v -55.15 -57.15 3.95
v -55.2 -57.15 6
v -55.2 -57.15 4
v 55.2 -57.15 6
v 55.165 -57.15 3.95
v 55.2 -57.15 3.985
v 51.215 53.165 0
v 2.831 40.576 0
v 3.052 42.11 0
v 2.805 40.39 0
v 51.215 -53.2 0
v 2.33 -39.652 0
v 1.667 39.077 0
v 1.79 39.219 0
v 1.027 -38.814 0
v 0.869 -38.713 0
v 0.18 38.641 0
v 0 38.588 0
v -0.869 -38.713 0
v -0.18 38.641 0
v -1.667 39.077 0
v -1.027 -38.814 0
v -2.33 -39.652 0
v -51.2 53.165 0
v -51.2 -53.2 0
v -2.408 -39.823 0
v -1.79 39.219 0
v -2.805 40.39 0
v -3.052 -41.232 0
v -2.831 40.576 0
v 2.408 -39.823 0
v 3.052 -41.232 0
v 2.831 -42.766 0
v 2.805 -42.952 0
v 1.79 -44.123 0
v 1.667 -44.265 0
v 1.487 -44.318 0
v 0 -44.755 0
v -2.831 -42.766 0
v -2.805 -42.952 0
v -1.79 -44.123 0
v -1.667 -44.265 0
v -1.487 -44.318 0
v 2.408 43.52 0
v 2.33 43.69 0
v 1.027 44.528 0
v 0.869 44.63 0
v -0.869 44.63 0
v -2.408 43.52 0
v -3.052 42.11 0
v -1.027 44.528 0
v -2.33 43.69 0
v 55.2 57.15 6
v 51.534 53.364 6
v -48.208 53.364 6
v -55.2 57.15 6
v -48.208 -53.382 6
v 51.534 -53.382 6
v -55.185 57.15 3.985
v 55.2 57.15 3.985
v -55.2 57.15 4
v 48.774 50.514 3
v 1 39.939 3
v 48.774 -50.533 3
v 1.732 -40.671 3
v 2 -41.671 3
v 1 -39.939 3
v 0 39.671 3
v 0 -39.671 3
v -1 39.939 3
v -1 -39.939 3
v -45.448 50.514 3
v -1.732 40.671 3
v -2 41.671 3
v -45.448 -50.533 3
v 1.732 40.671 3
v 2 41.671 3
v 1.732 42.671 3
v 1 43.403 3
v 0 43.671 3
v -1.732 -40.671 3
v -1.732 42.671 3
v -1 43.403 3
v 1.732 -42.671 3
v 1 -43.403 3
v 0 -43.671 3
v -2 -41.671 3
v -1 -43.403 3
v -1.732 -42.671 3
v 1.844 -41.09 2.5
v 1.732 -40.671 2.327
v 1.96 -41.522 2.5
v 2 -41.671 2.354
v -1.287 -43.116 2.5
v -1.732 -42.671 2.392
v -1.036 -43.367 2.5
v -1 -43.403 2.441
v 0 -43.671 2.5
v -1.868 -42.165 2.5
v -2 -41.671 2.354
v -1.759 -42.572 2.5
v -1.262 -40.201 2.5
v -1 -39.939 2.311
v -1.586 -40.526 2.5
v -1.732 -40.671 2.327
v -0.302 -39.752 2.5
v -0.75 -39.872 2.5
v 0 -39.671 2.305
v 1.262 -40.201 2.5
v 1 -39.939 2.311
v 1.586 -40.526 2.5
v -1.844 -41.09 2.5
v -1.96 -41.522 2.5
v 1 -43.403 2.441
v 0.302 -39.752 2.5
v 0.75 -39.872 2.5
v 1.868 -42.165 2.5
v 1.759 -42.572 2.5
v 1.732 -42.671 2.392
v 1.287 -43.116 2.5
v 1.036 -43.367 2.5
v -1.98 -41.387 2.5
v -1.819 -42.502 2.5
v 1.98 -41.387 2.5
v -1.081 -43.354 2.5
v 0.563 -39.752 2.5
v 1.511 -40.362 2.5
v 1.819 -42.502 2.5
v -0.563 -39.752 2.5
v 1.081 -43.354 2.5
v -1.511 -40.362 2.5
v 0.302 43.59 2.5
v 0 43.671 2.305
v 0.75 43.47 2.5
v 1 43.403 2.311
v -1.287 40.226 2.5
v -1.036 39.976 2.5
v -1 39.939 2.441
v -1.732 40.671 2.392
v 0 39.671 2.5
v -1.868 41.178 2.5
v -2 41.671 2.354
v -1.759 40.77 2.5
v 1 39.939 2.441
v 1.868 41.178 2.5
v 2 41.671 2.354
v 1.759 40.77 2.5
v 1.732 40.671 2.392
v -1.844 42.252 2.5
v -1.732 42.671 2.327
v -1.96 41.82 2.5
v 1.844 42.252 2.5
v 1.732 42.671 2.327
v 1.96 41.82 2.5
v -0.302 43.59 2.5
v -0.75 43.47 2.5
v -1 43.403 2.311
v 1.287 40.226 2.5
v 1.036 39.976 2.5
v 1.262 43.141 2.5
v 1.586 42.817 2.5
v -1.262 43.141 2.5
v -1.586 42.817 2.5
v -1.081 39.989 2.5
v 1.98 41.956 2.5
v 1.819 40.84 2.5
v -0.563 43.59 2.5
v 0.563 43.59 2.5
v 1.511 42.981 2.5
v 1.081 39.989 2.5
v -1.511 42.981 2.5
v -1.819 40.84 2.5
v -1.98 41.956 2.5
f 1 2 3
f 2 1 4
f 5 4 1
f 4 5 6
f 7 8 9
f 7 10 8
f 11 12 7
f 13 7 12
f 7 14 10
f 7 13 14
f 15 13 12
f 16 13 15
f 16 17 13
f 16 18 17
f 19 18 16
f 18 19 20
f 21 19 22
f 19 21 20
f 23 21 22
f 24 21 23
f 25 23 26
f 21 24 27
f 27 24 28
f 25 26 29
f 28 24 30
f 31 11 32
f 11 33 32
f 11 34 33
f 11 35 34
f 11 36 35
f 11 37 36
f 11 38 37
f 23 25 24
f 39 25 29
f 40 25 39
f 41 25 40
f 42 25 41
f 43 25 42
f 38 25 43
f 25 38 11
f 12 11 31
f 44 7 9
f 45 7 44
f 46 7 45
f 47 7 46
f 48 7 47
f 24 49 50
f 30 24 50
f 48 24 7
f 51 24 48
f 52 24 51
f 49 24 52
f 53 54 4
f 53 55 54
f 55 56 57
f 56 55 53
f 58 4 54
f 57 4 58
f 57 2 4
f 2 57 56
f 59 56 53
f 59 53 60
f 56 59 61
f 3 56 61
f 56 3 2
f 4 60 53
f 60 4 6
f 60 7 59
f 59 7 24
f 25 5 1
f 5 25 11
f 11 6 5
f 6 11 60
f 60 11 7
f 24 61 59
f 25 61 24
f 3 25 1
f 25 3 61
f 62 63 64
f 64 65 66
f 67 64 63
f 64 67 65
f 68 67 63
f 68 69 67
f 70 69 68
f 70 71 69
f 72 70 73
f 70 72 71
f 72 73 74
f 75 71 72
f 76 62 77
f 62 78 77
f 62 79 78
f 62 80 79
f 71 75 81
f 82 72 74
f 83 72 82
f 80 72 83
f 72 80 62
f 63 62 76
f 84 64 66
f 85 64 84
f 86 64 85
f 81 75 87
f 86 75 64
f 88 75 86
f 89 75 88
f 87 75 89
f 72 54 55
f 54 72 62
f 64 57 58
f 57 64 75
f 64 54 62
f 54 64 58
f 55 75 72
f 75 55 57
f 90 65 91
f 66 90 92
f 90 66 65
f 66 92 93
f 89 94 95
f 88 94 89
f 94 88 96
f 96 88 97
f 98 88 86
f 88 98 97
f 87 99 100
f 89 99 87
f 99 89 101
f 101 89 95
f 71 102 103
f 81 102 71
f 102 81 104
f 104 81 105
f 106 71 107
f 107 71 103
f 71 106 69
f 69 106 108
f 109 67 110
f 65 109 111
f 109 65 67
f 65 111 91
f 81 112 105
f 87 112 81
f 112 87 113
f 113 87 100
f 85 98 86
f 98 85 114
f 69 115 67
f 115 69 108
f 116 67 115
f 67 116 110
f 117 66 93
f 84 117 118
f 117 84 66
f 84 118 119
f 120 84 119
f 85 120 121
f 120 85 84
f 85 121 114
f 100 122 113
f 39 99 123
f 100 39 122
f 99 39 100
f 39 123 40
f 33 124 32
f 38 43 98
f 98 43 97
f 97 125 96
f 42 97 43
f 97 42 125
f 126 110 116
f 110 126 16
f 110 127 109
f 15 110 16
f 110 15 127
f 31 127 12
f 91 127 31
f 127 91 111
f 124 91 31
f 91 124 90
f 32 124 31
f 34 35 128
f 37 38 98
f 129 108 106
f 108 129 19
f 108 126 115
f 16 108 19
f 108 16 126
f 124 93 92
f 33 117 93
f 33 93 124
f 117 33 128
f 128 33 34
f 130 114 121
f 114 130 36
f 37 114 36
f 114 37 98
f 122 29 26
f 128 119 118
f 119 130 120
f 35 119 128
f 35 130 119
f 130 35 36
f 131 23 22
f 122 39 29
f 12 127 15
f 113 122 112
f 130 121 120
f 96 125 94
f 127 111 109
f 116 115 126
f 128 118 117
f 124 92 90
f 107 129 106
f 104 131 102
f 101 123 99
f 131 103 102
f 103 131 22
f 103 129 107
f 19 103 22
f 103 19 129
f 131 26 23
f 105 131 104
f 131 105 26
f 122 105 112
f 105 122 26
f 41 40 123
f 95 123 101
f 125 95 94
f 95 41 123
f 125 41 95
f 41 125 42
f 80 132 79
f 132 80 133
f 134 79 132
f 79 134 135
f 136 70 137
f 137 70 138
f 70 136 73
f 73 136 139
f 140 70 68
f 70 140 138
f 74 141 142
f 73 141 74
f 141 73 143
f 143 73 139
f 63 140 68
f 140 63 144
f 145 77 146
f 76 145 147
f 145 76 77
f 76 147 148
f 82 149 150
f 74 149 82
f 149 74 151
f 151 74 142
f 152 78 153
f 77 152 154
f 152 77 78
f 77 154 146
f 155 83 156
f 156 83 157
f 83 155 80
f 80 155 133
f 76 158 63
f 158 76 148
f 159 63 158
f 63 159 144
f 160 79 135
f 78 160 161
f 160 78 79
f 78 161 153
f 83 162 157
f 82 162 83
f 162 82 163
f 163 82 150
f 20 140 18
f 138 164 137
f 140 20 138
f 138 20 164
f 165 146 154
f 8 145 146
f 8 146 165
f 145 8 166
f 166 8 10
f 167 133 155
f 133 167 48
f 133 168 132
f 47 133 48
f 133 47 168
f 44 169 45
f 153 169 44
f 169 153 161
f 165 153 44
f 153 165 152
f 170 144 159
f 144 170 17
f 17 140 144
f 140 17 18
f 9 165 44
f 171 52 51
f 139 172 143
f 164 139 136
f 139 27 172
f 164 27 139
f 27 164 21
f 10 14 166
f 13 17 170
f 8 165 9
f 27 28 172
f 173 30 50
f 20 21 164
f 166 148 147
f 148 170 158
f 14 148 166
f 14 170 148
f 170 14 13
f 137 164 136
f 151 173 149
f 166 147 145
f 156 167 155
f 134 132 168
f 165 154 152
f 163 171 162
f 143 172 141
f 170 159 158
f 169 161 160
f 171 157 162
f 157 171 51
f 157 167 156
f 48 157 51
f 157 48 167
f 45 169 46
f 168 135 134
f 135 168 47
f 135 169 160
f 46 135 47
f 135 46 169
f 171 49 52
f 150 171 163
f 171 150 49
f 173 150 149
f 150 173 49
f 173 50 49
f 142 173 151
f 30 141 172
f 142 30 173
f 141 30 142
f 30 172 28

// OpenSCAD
// WALLY - Wall Plate Customizer v1.3
// by TheNewHobbyist 2013 (http://thenewhobbyist.com)
// http://www.thingiverse.com/thing:47956
//
// Most of the connectors used with this thing are panel mount connectors from
// www.DataPro.net I can't vouch for their quality but they did have easy to
// find dimensions for their products so I used them.
//
// This could be tightened up considerably but I thought I'd get it out there for people
// to experiment with before I lose my mind staring at it too long. Also this is my
// first OpenSCAD model so cut me some slack ;)
//
//   Notes:
//
// * The plug types "Duplex Outlet", "Long_Toggle Switch", "Toggle Switch", and "Rocker"
//   will all use the entire plate when selected in top or bottom configuration. The
//   other selection (if not "none" will be selected.
//
// * "None" and "Blank should not be considered equal. if "None" is selected for one of
//   the two holes on a plate the other selection will be centered on that plate. If
//   "Blank" is selected that plug location will remain blank but the other selection
//   will NOT move into a centered position.
//
//	Change Log:
//
//	v1.1
//	UPDATED: Screw hole locations for designer and toggle plate types.
//	UPDATED: Hole size for designer plate type.
//	UPDATED: Outlet hole spacing
//
//	v1.2
//	ADDED: Long Toggle Switch for laird
//
//	v1.3
//	ADDED: 3 new sizes for plate export: Standard, Junior-Jumbo, and Jumbo.
//

  //////////////////////////
 // Customizer Settings: //
//////////////////////////

//How big are we talkin' here?
plate_width = 1; //	[1:5]

// Bigger hole in your wall? Try this
plate_size = 0; // [0:Standard, 1:Junior-Jumbo, 2:Jumbo,]

//Pick a plug or full plate type
1st_plate = "none";  //	["none":None, "blank":Blank Port, "toggle":Full Plate - Toggle Switch, "long_toggle":Full Plate - Long Toggle Switch, "outlet":Full Plate - Duplex Outlet, "rocker":Full Plate - Rocker/Designer Plate, "keystone1":Keystone Jack, "vga":VGA Port, "hdmi":HDMI Port, "dvi":DVI-I Port, "displayport":Displayport, "cat5e":Cat5e/Cat6 Port, "usb-a":USB-A Port, "usb-b":USB-B Port, "firewire":Firewire IEEE 1394 Port, "db09":DB-09 Port, "ps2":PS2 Port, "f-type": F-Type/Coaxial Port,"svideo":S-Video Port, "stereo":Stereo Headphone Jack]
//Pick a bottom plug type or leave as none
1st_plate_bottom_hole = "none";  //	["none":None, "blank":Blank Port, "keystone1":Keystone Jack, "vga":VGA Port, "hdmi":HDMI Port, "dvi":DVI-I Port, "displayport":Displayport, "cat5e":Cat5e/Cat6 Port, "usb-a":USB-A Port, "usb-b":USB-B Port, "firewire":Firewire IEEE 1394 Port, "db09":DB-09 Port, "ps2":PS2 Port, "f-type": F-Type/Coaxial Port,"svideo":S-Video Port, "stereo":Stereo Headphone Jack]
//Pick a plug or full plate type
2nd_plate = "none";  //	["none":None, "blank":Blank Port, "toggle":Full Plate - Toggle Switch, "long_toggle":Full Plate - Long Toggle Switch, "outlet":Full Plate - Duplex Outlet, "rocker":Full Plate - Rocker/Designer Plate, "keystone1":Keystone Jack, "vga":VGA Port, "hdmi":HDMI Port, "dvi":DVI-I Port, "displayport":Displayport, "cat5e":Cat5e/Cat6 Port, "usb-a":USB-A Port, "usb-b":USB-B Port, "firewire":Firewire IEEE 1394 Port, "db09":DB-09 Port, "ps2":PS2 Port, "f-type": F-Type/Coaxial Port,"svideo":S-Video Port, "stereo":Stereo Headphone Jack]
//Pick a bottom plug type or leave as none
2nd_plate_bottom_hole = "none";  //	["none":None, "blank":Blank Port, "keystone1":Keystone Jack, "vga":VGA Port, "hdmi":HDMI Port, "dvi":DVI-I Port, "displayport":Displayport, "cat5e":Cat5e/Cat6 Port, "usb-a":USB-A Port, "usb-b":USB-B Port, "firewire":Firewire IEEE 1394 Port, "db09":DB-09 Port, "ps2":PS2 Port, "f-type": F-Type/Coaxial Port,"svideo":S-Video Port, "stereo":Stereo Headphone Jack]
//Pick a plug or full plate type
3rd_plate = "none";  //	["none":None, "blank":Blank Port, "toggle":Full Plate - Toggle Switch, "long_toggle":Full Plate - Long Toggle Switch, "outlet":Full Plate - Duplex Outlet, "rocker":Full Plate - Rocker/Designer Plate, "keystone1":Keystone Jack, "vga":VGA Port, "hdmi":HDMI Port, "dvi":DVI-I Port, "displayport":Displayport, "cat5e":Cat5e/Cat6 Port, "usb-a":USB-A Port, "usb-b":USB-B Port, "firewire":Firewire IEEE 1394 Port, "db09":DB-09 Port, "ps2":PS2 Port, "f-type": F-Type/Coaxial Port,"svideo":S-Video Port, "stereo":Stereo Headphone Jack]
//Pick a bottom plug type or leave as none
3rd_plate_bottom_hole = "none";  //	["none":None, "blank":Blank Port, "keystone1":Keystone Jack, "vga":VGA Port, "hdmi":HDMI Port, "dvi":DVI-I Port, "displayport":Displayport, "cat5e":Cat5e/Cat6 Port, "usb-a":USB-A Port, "usb-b":USB-B Port, "firewire":Firewire IEEE 1394 Port, "db09":DB-09 Port, "ps2":PS2 Port, "f-type": F-Type/Coaxial Port,"svideo":S-Video Port, "stereo":Stereo Headphone Jack]
//Pick a plug or full plate type
4th_plate = "none";  //["none":None, "blank":Blank Port, "toggle":Full Plate - Toggle Switch, "long_toggle":Full Plate - Long Toggle Switch, "outlet":Full Plate - Duplex Outlet, "rocker":Full Plate - Rocker/Designer Plate, "keystone1":Keystone Jack, "vga":VGA Port, "hdmi":HDMI Port, "dvi":DVI-I Port, "displayport":Displayport, "cat5e":Cat5e/Cat6 Port, "usb-a":USB-A Port, "usb-b":USB-B Port, "firewire":Firewire IEEE 1394 Port, "db09":DB-09 Port, "ps2":PS2 Port, "f-type": F-Type/Coaxial Port,"svideo":S-Video Port, "stereo":Stereo Headphone Jack]
//Pick a bottom plug type or leave as none
4th_plate_bottom_hole = "none";  //	["none":None, "blank":Blank Port, "keystone1":Keystone Jack, "vga":VGA Port, "hdmi":HDMI Port, "dvi":DVI-I Port, "displayport":Displayport, "cat5e":Cat5e/Cat6 Port, "usb-a":USB-A Port, "usb-b":USB-B Port, "firewire":Firewire IEEE 1394 Port, "db09":DB-09 Port, "ps2":PS2 Port, "f-type": F-Type/Coaxial Port,"svideo":S-Video Port, "stereo":Stereo Headphone Jack]
//Pick a plug or full plate type
5th_plate = "none";  //["none":None, "blank":Blank Port, "toggle":Full Plate - Toggle Switch, "long_toggle":Full Plate - Long Toggle Switch, "outlet":Full Plate - Duplex Outlet, "rocker":Full Plate - Rocker/Designer Plate, "keystone1":Keystone Jack, "vga":VGA Port, "hdmi":HDMI Port, "dvi":DVI-I Port, "displayport":Displayport, "cat5e":Cat5e/Cat6 Port, "usb-a":USB-A Port, "usb-b":USB-B Port, "firewire":Firewire IEEE 1394 Port, "db09":DB-09 Port, "ps2":PS2 Port, "f-type": F-Type/Coaxial Port,"svideo":S-Video Port, "stereo":Stereo Headphone Jack]
//Pick a bottom plug type or leave as none
5th_plate_bottom_hole = "none";  //	["none":None, "blank":Blank Port, "keystone1":Keystone Jack, "vga":VGA Port, "hdmi":HDMI Port, "dvi":DVI-I Port, "displayport":Displayport, "cat5e":Cat5e/Cat6 Port, "usb-a":USB-A Port, "usb-b":USB-B Port, "firewire":Firewire IEEE 1394 Port, "db09":DB-09 Port, "ps2":PS2 Port, "f-type": F-Type/Coaxial Port,"svideo":S-Video Port, "stereo":Stereo Headphone Jack]

  //////////////////////
 // Static Settings: //
//////////////////////

module GoAwayCustomizer() {
// This module is here to stop Customizer from picking up the variables below
}

l_offset = [55.2,39.6875,44.45];//34.925,39.6875
r_offset = [55.2,39.6875,44.45];
spacer = [0,0,46.0375,92.075,138.1125,184.15];
solid_plate_width = l_offset[plate_size] + spacer[plate_width] + r_offset[plate_size];//!!!!plate width squeaspacer[plate_width*2] r!!!!!

height_sizes = [114.3,123.825,133.35];

height =114.3 ; //plate height (static)114.3
gang_width=[0,69.86,115.824,161.925,206.375,254]; // Plate widths (standard)69.86

edgewidth = solid_plate_width + 10; // Bevel setting for top and bottom
rightbevel = solid_plate_width -4; // Bevel for right side (scales)

left_offset = 34.925; // Offset first hole position34.925
switch_offset = 46.0375; // Offset all additional holes
thinner_offset=[0,0.92,0.95,0.96,0.97,0.973]; // Manual fix for right side wackiness

positions=[height_sizes[plate_size]/2,height_sizes[plate_size]/2 - 14.25,height_sizes[plate_size]/2 + 14.25];

// preview[view:north, tilt:bottom]

  ///////////////////
 // Hole Control: //
///////////////////

module plate1(){
	if (1st_plate == "toggle" || 1st_plate_bottom_hole == "toggle"){
		translate([0,l_offset[plate_size],0]) toggle_screws();
		translate([0,l_offset[plate_size],0]) hole("toggle");
		}
	else if (1st_plate == "long_toggle" || 1st_plate_bottom_hole == "long_toggle"){
		translate([0,l_offset[plate_size],0]) toggle_screws();
		translate([0,l_offset[plate_size],0]) hole("long_toggle");
		}
	else if (1st_plate == "rocker" || 1st_plate_bottom_hole == "rocker"){
		translate([0,l_offset[plate_size],0]) rocker_screws();
		translate([0,l_offset[plate_size],0]) hole("rocker");
		}
	else if (1st_plate == "outlet" || 1st_plate_bottom_hole == "outlet") {
	translate([0,l_offset[plate_size],0]) hole("outlet");
	}
	else if (1st_plate_bottom_hole == "none") {
		translate([0,l_offset[plate_size],0]) box_screws();
		translate([positions[0],l_offset[plate_size],0]) hole(1st_plate);
			}
	else if (1st_plate == "none") {
		translate([0,l_offset[plate_size],0]) box_screws();
		translate([positions[0],l_offset[plate_size],0]) hole(1st_plate_bottom_hole);
			}
	else {
	translate([0,l_offset[plate_size],0]) box_screws();
	translate([positions[1],l_offset[plate_size],0]) hole(1st_plate);
	translate([positions[2],l_offset[plate_size],0]) hole(1st_plate_bottom_hole);
	}
}

module plate2(){
	if (2nd_plate == "toggle" || 2nd_plate_bottom_hole == "toggle"){
		translate([0,l_offset[plate_size] + switch_offset,0]) toggle_screws();
		translate([0,l_offset[plate_size] + switch_offset,0]) hole("toggle");
		}
	else if (2nd_plate == "long_toggle" || 2nd_plate_bottom_hole == "long_toggle"){
		translate([0,l_offset[plate_size] + switch_offset,0]) toggle_screws();
		translate([0,l_offset[plate_size] + switch_offset,0]) hole("long_toggle");
		}
	else if (2nd_plate == "rocker" || 2nd_plate_bottom_hole == "rocker"){
		translate([0,l_offset[plate_size] + switch_offset,0]) rocker_screws();
		translate([0,l_offset[plate_size] + switch_offset,0]) hole("rocker");
		}
	else if (2nd_plate == "outlet" || 2nd_plate_bottom_hole == "outlet") {
	translate([0,l_offset[plate_size] + switch_offset,0]) hole("outlet");
	}
	else if (2nd_plate_bottom_hole == "none") {
		translate([0,l_offset[plate_size] + switch_offset,0]) box_screws();
		translate([positions[0],l_offset[plate_size] + switch_offset,0]) hole(2nd_plate);
			}
	else if (2nd_plate == "none") {
		translate([0,l_offset[plate_size] + switch_offset,0]) box_screws();
		translate([positions[0],l_offset[plate_size] + switch_offset,0]) hole(2nd_plate_bottom_hole);
			}
	else {
	translate([0,l_offset[plate_size] + switch_offset,0]) box_screws();
	translate([positions[1],l_offset[plate_size] + switch_offset,0]) hole(2nd_plate);
	translate([positions[2],l_offset[plate_size] + switch_offset,0]) hole(2nd_plate_bottom_hole);
	}
}

module plate3(){
	if (3rd_plate == "toggle" || 3rd_plate_bottom_hole == "toggle"){
		translate([0,l_offset[plate_size] + switch_offset * 2,0]) toggle_screws();
		translate([0,l_offset[plate_size] + switch_offset * 2,0]) hole("toggle");
		}
	else if (3rd_plate == "long_toggle" || 3rd_plate_bottom_hole == "long_toggle"){
		translate([0,l_offset[plate_size] + switch_offset * 2,0]) toggle_screws();
		translate([0,l_offset[plate_size] + switch_offset * 2,0]) hole("long_toggle");
		}
	else if (3rd_plate == "rocker" || 3rd_plate_bottom_hole == "rocker"){
		translate([0,l_offset[plate_size] + switch_offset * 2,0]) rocker_screws();
		translate([0,l_offset[plate_size] + switch_offset * 2,0]) hole("rocker");
		}
	else if (3rd_plate == "outlet" || 3rd_plate_bottom_hole == "outlet") {
	translate([0,l_offset[plate_size] + switch_offset * 2,0]) hole("outlet");
	}
	else if (3rd_plate_bottom_hole == "none") {
		translate([0,l_offset[plate_size] + switch_offset * 2,0]) box_screws();
		translate([positions[0],l_offset[plate_size] + switch_offset * 2,0]) hole(3rd_plate);
			}
	else if (3rd_plate == "none") {
		translate([0,l_offset[plate_size] + switch_offset * 2,0]) box_screws();
		translate([positions[0],l_offset[plate_size] + switch_offset * 2,0]) hole(3rd_plate_bottom_hole);
			}
	else {
	translate([0,l_offset[plate_size] + switch_offset * 2,0]) box_screws();
	translate([positions[1],l_offset[plate_size] + switch_offset * 2,0]) hole(3rd_plate);
	translate([positions[2],l_offset[plate_size] + switch_offset * 2,0]) hole(3rd_plate_bottom_hole);
	}
}

module plate4(){
	if (4th_plate == "toggle" || 4th_plate_bottom_hole == "toggle"){
		translate([0,l_offset[plate_size] + switch_offset * 3,0]) toggle_screws();
		translate([0,l_offset[plate_size] + switch_offset * 3,0]) hole("toggle");
		}
	else if (4th_plate == "long_toggle" || 4th_plate_bottom_hole == "long_toggle"){
		translate([0,l_offset[plate_size] + switch_offset * 3,0]) toggle_screws();
		translate([0,l_offset[plate_size] + switch_offset * 3,0]) hole("long_toggle");
		}
	else if (4th_plate == "rocker" || 4th_plate_bottom_hole == "rocker"){
		translate([0,l_offset[plate_size] + switch_offset * 3,0]) rocker_screws();
		translate([0,l_offset[plate_size] + switch_offset * 3,0]) hole("rocker");
		}
	else if (4th_plate == "outlet" || 4th_plate_bottom_hole == "outlet") {
	translate([0,l_offset[plate_size] + switch_offset * 3,0]) hole("outlet");
	}
	else if (4th_plate_bottom_hole == "none") {
		translate([0,l_offset[plate_size] + switch_offset * 3,0]) box_screws();
		translate([positions[0],l_offset[plate_size] + switch_offset * 3,0]) hole(4th_plate);
			}
	else if (4th_plate == "none") {
		translate([0,l_offset[plate_size] + switch_offset * 3,0]) box_screws();
		translate([positions[0],l_offset[plate_size] + switch_offset * 3,0]) hole(4th_plate_bottom_hole);
			}
	else {
	translate([0,l_offset[plate_size] + switch_offset * 3,0]) box_screws();
	translate([positions[1],l_offset[plate_size] + switch_offset * 3,0]) hole(4th_plate);
	translate([positions[2],l_offset[plate_size] + switch_offset * 3,0]) hole(4th_plate_bottom_hole);
	}
}

module plate5(){
	if (5th_plate == "toggle" || 5th_plate_bottom_hole == "toggle"){
		translate([0,l_offset[plate_size] + switch_offset * 4,0]) toggle_screws();
		translate([0,l_offset[plate_size] + switch_offset * 4,0]) hole("toggle");
		}
	else if (5th_plate == "long_toggle" || 5th_plate_bottom_hole == "long_toggle"){
		translate([0,l_offset[plate_size] + switch_offset * 4,0]) toggle_screws();
		translate([0,l_offset[plate_size] + switch_offset * 4,0]) hole("long_toggle");
		}
	else if (5th_plate == "rocker" || 5th_plate_bottom_hole == "rocker"){
		translate([0,l_offset[plate_size] + switch_offset * 4,0]) rocker_screws();
		translate([0,l_offset[plate_size] + switch_offset * 4,0]) hole("rocker");
		}
	else if (5th_plate == "outlet" || 5th_plate_bottom_hole == "outlet") {
	translate([0,l_offset[plate_size] + switch_offset * 4,0]) hole("outlet");
	}
	else if (5th_plate_bottom_hole == "none") {
		translate([0,l_offset[plate_size] + switch_offset * 4,0]) box_screws();
		translate([positions[0],l_offset[plate_size] + switch_offset * 4,0]) hole(5th_plate);
			}
	else if (5th_plate == "none") {
		translate([0,l_offset[plate_size] + switch_offset * 4,0]) box_screws();
		translate([positions[0],l_offset[plate_size] + switch_offset * 4,0]) hole(5th_plate_bottom_hole);
			}
	else {
	translate([0,l_offset[plate_size] + switch_offset * 4,0]) box_screws();
	translate([positions[1],l_offset[plate_size] + switch_offset * 4,0]) hole(5th_plate);
	translate([positions[2],l_offset[plate_size] + switch_offset * 4,0]) hole(5th_plate_bottom_hole);
	}
}

  /////////////////
 // SolidWorks: //
/////////////////

module plate1_solid(){
if (1st_plate == "keystone1" && 1st_plate_bottom_hole == "none") {
	translate([height_sizes[plate_size]/2 + 14.3,l_offset[plate_size] - 11.5,-3.9]) hole("keystone_solid");
	}
else if (1st_plate == "keystone1" && 1st_plate_bottom_hole != "outlet" && 1st_plate_bottom_hole != "toggle" && 1st_plate_bottom_hole != "rocker") {
	translate([height_sizes[plate_size]/2,l_offset[plate_size] - 11.5,-3.9]) hole("keystone_solid");
	}
if (1st_plate_bottom_hole == "keystone1" && 1st_plate == "none") {
	translate([height_sizes[plate_size]/2 + 14.3,l_offset[plate_size] - 11.5,-3.9]) hole("keystone_solid");
	}
else if (1st_plate_bottom_hole == "keystone1" && 1st_plate != "outlet" && 1st_plate != "toggle" && 1st_plate != "rocker") {
	translate([height_sizes[plate_size]/2 + 28.5,l_offset[plate_size] - 11.5,-3.9]) hole("keystone_solid");
	}

}

module plate2_solid(){
if (2nd_plate == "keystone1" && 2nd_plate_bottom_hole == "none") {
	translate([height_sizes[plate_size]/2 + 14.3,l_offset[plate_size] - 11.5 + switch_offset,-3.9]) hole("keystone_solid");
	}
else if (2nd_plate == "keystone1" && 2nd_plate_bottom_hole != "outlet" && 2nd_plate_bottom_hole != "toggle" && 2nd_plate_bottom_hole != "rocker") {
	translate([height_sizes[plate_size]/2,l_offset[plate_size] - 11.5 + switch_offset,-3.9]) hole("keystone_solid");
	}
if (2nd_plate_bottom_hole == "keystone1" && 2nd_plate == "none") {
	translate([height_sizes[plate_size]/2 + 14.3,l_offset[plate_size] - 11.5 + switch_offset,-3.9]) hole("keystone_solid");
	}
else if (2nd_plate_bottom_hole == "keystone1" && 2nd_plate != "outlet" && 2nd_plate != "toggle" && 2nd_plate != "rocker") {
	translate([height_sizes[plate_size]/2 + 28.5,l_offset[plate_size] - 11.5 + switch_offset,-3.9]) hole("keystone_solid");
	}

}

module plate3_solid(){
if (3rd_plate == "keystone1" && 3rd_plate_bottom_hole == "none") {
	translate([height_sizes[plate_size]/2 + 14.3,l_offset[plate_size] - 11.5 + switch_offset * 2,-3.9]) hole("keystone_solid");
	}
else if (3rd_plate == "keystone1" && 3rd_plate_bottom_hole != "outlet" && 3rd_plate_bottom_hole != "toggle" && 3rd_plate_bottom_hole != "rocker") {
	translate([height_sizes[plate_size]/2,l_offset[plate_size] - 11.5 + switch_offset * 2,-3.9]) hole("keystone_solid");
	}
if (3rd_plate_bottom_hole == "keystone1" && 3rd_plate == "none") {
	translate([height_sizes[plate_size]/2 + 14.3,l_offset[plate_size] - 11.5 + switch_offset * 2,-3.9]) hole("keystone_solid");
	}
else if (3rd_plate_bottom_hole == "keystone1" && 3rd_plate != "outlet" && 3rd_plate != "toggle" && 3rd_plate != "rocker") {
	translate([height_sizes[plate_size]/2 + 28.5,l_offset[plate_size] - 11.5 + switch_offset * 2,-3.9]) hole("keystone_solid");
	}

}

module plate4_solid(){
if (4th_plate == "keystone1" && 4th_plate_bottom_hole == "none") {
	translate([height_sizes[plate_size]/2 + 14.3,l_offset[plate_size] - 11.5 + switch_offset * 3,-3.9]) hole("keystone_solid");
	}
else if (4th_plate == "keystone1" && 4th_plate_bottom_hole != "outlet" && 4th_plate_bottom_hole != "toggle" && 4th_plate_bottom_hole != "rocker") {
	translate([height_sizes[plate_size]/2,l_offset[plate_size] - 11.5 + switch_offset * 3,-3.9]) hole("keystone_solid");
	}
if (4th_plate_bottom_hole == "keystone1" && 4th_plate == "none") {
	translate([height_sizes[plate_size]/2 + 14.3,l_offset[plate_size] - 11.5 + switch_offset * 3,-3.9]) hole("keystone_solid");
	}
else if (4th_plate_bottom_hole == "keystone1" && 4th_plate != "outlet" && 4th_plate != "toggle" && 4th_plate != "rocker") {
	translate([height_sizes[plate_size]/2 + 28.5,l_offset[plate_size] - 11.5 + switch_offset * 3,-3.9]) hole("keystone_solid");
	}

}

module plate5_solid(){
if (5th_plate == "keystone1" && 5th_plate_bottom_hole == "none") {
	translate([height_sizes[plate_size]/2 + 14.3,l_offset[plate_size] - 11.5 + switch_offset * 4,-3.9]) hole("keystone_solid");
	}
else if (5th_plate == "keystone1" && 5th_plate_bottom_hole != "outlet" && 5th_plate_bottom_hole != "toggle" && 5th_plate_bottom_hole != "rocker") {
	translate([height_sizes[plate_size]/2,l_offset[plate_size] - 11.5 + switch_offset * 4,-3.9]) hole("keystone_solid");
	}
if (5th_plate_bottom_hole == "keystone1" && 5th_plate == "none") {
	translate([height_sizes[plate_size]/2 + 14.3,l_offset[plate_size] - 11.5 + switch_offset * 4,-3.9]) hole("keystone_solid");
	}
else if (5th_plate_bottom_hole == "keystone1" && 5th_plate != "outlet" && 5th_plate != "toggle" && 5th_plate != "rocker") {
	translate([height_sizes[plate_size]/2 + 28.5,l_offset[plate_size] - 11.5 + switch_offset * 4,-3.9]) hole("keystone_solid");
	}

}

  ///////////////////
 // PlateStation: //
///////////////////

//Plate size and bevel
module plate() {
	difference() {
		cube([height_sizes[plate_size],solid_plate_width,6]);//solid_plate_width
		translate([-4.3,-5,6.2]) rotate([0,45,0]) cube([6,edgewidth,6]); //Top Bevel
		translate([height_sizes[plate_size]-4.2,-5,6.25]) rotate([0,45,0]) cube([6,edgewidth,6]); //Bottom Bevel
		translate([height_sizes[plate_size]+10,-4.4,6.1]) rotate([0,45,90]) cube([6,height_sizes[plate_size]+20,6]); //Left Bevel (doesn't change)
		translate([height_sizes[plate_size]+10,rightbevel,6]) rotate([0,45,90]) cube([6,height_sizes[plate_size]+10,6]); //Right Bevel (scales right)
				}
			}


// Thinning Plate
module plate_inner() {
	scale([0.95,thinner_offset[plate_width],1]){
	translate([3,3,0]){
	difference() {
		cube([height_sizes[plate_size],solid_plate_width,6]);
		translate([-4.3,-5,6.2]) rotate([0,45,0]) cube([6,edgewidth,6]); //Top Bevel
		translate([height_sizes[plate_size]-4.2,-5,6.25]) rotate([0,45,0]) cube([6,edgewidth,6]); //Bottom Bevel
		translate([height_sizes[plate_size]+10,-4.4,6.1]) rotate([0,45,90]) cube([6,height_sizes[plate_size]+20,6]); //Left Bevel (doesn't change)
		translate([height_sizes[plate_size]+10,rightbevel,6]) rotate([0,45,90]) cube([6,height_sizes[plate_size]+10,6]); //Right Bevel (scales right)
				}
			}
		}
	}

// Box screw holes
module box_screws(){
	 translate([height_sizes[plate_size]/2 + 41.67125,0,-1]) cylinder(r=2, h=10, $fn=12);//23 position of holes
	 translate([height_sizes[plate_size]/2 + 41.67125,0,3.5]) cylinder(r1=2, r2=3.3, h=3);
	 translate([height_sizes[plate_size]/2 - 41.67125,0,-1]) cylinder(r=2, h=10, $fn=12);
	 translate([height_sizes[plate_size]/2 - 41.67125,0,3.5]) cylinder(r1=2, r2=3.3, h=3);
}

// Rocker/Designer screw holes
module rocker_screws(){
	 translate([height_sizes[plate_size]/2 + 48.41875,0,-1]) cylinder(r=2, h=10, $fn=12);
	 translate([height_sizes[plate_size]/2 + 48.41875,0,3.5]) cylinder(r1=2, r2=3.3, h=3);
	 translate([height_sizes[plate_size]/2 - 48.41875,0,-1]) cylinder(r=2, h=10, $fn=12);
	 translate([height_sizes[plate_size]/2 - 48.41875,0,3.5]) cylinder(r1=2, r2=3.3, h=3);
}

// Toggle screw holes
module toggle_screws(){
	 translate([height_sizes[plate_size]/2 + 30.1625,0,-1]) cylinder(r=2, h=10, $fn=12);
	 translate([height_sizes[plate_size]/2 + 30.1625,0,3.5]) cylinder(r1=2, r2=3.3, h=3);
	 translate([height_sizes[plate_size]/2 - 30.1625,0,-1]) cylinder(r=2, h=10, $fn=12);
	 translate([height_sizes[plate_size]/2 - 30.1625,0,3.5]) cylinder(r1=2, r2=3.3, h=3);
}

  ///////////////
 // Portland: //
///////////////

// Hole Cutout definitions
module hole(hole_type) {


// Toggle switch hole
	if (hole_type == "toggle") {
		translate([height_sizes[plate_size]/2,0,0]) cube([23.8125,10.3188,15], center = true);
		 						}

// Toggle switch hole and screw holes
	if (hole_type == "long_toggle") {
		translate([height_sizes[plate_size]/2,0,0]) cube([43.6563,11.9063,15], center = true);
		 						}

// Rocker switch plate
	if (hole_type == "rocker") {
		translate([height_sizes[plate_size]/2,0,0]) cube([67.1,33.3,15], center = true);

		 						}

// Duplex power outlet plate or dual side toggles
	if (hole_type == "outlet" || hole_type == "dualsidetoggle") {
		translate([height_sizes[plate_size]/2 + 19.3915,0,0]) {
			difference() {
				cylinder(r=17.4625, h=15, center = true);
				translate([-24.2875,-15,-2]) cube([10,37,15], center = false);
				translate([14.2875,-15,-2]) cube([10,37,15], center = false);
								}
							}
		translate([height_sizes[plate_size]/2 - 19.3915,0,0]){
			difference(){
				cylinder(r=17.4625, h=15, center = true);
				translate([-24.2875,-15,-2]) cube([10,37,15], center = false);
				translate([14.2875,-15,-2]) cube([10,37,15], center = false);
								}
							}
		translate([height_sizes[plate_size]/2,0,-1]) cylinder(r=2, h=10);
		translate([height_sizes[plate_size]/2,0,3.5]) cylinder(r1=2, r2=3.3, h=3);
							}

// Blank plate
	if (hole_type == "blank") { }

// VGA & DB09 plate
// VGA Fits http://www.datapro.net/products/vga-dual-panel-mount-f-f-cable.html
// DB09 Fits http://www.datapro.net/products/db9-serial-panel-mount-male-extension.html
	if (hole_type == "vga" || hole_type == "db09") {

			translate([0,-12.5,3]) cylinder(r=1.75, h=10, center = true);
			translate([0,12.5,3]) cylinder(r=1.75, h=10, center = true);
				difference(){
					cube([10,19,13], center=true);
					translate([-5,-9.2,1]) rotate([0,0,-35.6]) cube([4.4,2.4,15], center=true);
					translate([.9,-11.2,0]) rotate([0,0,9.6]) cube([10,4.8,15], center=true);
					translate([4.6,-8.5,0]) rotate([0,0,37.2]) cube([4.4,2.4,15], center=true);
					translate([-5,9.2,1]) rotate([0,0,35.6]) cube([4.4,2.4,15], center=true);
					translate([0.9,11.2,0]) rotate([0,0,-9.6]) cube([10,4.8,15], center=true);
					translate([4.6,8.5,0]) rotate([0,0,-37.2]) cube([4.4,2.4,15], center=true);
								}
						}

// HDMI plate
// Fits http://www.datapro.net/products/hdmi-panel-mount-extension-cable.html
	if (hole_type == "hdmi") {
		translate([0,-13,3]) cylinder(r=1.75, h=10, center = true);
		translate([0,13,3]) cylinder(r=1.75, h=10, center = true);
		translate([0,0,3]) cube([6,16,10], center=true);
							}

// DVI-I plate
// Fits http://www.datapro.net/products/dvi-i-panel-mount-extension-cable.html
	if (hole_type == "dvi") {
		translate([0,-16,3]) cylinder(r=1.75, h=10, center = true);
		translate([0,16,3]) cylinder(r=1.75, h=10, center = true);
		translate([0,0,3]) cube([10,26,10], center=true);
							}

// DisplayPort plate
// Fits http://www.datapro.net/products/dvi-i-panel-mount-extension-cable.html
	if (hole_type == "displayport") {
		translate([0,-13.5,3]) cylinder(r=1.75, h=10, center = true);
		translate([0,13.5,3]) cylinder(r=1.75, h=10, center = true);
		translate([0,0,0]){
			difference(){
				translate([0,0,3]) cube([7,19,10], center=true);
				translate([2.47,-9.37,3]) rotate([0,0,-54.6]) cube([3,5,14], center=true);
						}
								}
									}

// USB-A Plate
// Fits http://www.datapro.net/products/usb-panel-mount-type-a-cable.html
	if (hole_type == "usb-a") {
		translate([0,-15,3]) cylinder(r=1.75, h=10, center = true);
		translate([0,15,3]) cylinder(r=1.75, h=10, center = true);
		translate([0,0,3]) cube([8,16,10], center=true);
							}

// USB-B Plate
// Fits http://www.datapro.net/products/usb-panel-mount-type-b-cable.html
	if (hole_type == "usb-b") {
		translate([0,-13,3]) cylinder(r=1.75, h=10, center = true);
		translate([0,13,3]) cylinder(r=1.75, h=10, center = true);
		translate([0,0,3]) cube([11,12,10], center=true);
							}

// 1394 Firewire Plate
// Fits http://www.datapro.net/products/firewire-panel-mount-extension.html
	if (hole_type == "firewire") {
		translate([0,-13.5,3]) cylinder(r=1.75, h=10, center = true);
		translate([0,13.5,3]) cylinder(r=1.75, h=10, center = true);
		translate([0,0,3]) cube([7,12,10], center=true);
							}

// F-Type / Cable TV Plate
// Fits http://www.datapro.net/products/f-type-panel-mounting-coupler.html
	if (hole_type == "f-type") {
		translate([0,0,3]) cylinder(r=4.7625, h=10, center=true);
							}

// Cat5e & Gat6 plate
// Cat5e Fits http://www.datapro.net/products/cat-5e-panel-mount-ethernet.html
// Cat6 Fits hhttp://www.datapro.net/products/cat-6-panel-mount-ethernet.html
	if (hole_type == "cat5e" || hole_type == "cat6") {
		translate([0,-12.5,3]) cylinder(r=1.75, h=10, center = true);
		translate([0,12.5,3]) cylinder(r=1.75, h=10, center = true);
		translate([0,0,3]) cube([15,15,10], center=true);
		}

// S-Video & PS2 plate
// S-Video Fits hhttp://www.datapro.net/products/cat-6-panel-mount-ethernet.html
// PS2 http://www.datapro.net/products/ps2-panel-mount-extension-cable.html
	if (hole_type == "svideo" || hole_type == "ps2") {
		translate([0,-10,3]) cylinder(r=1.75, h=10, center = true);
		translate([0,10,3]) cylinder(r=1.75, h=10, center = true);
		translate([0,0,3]) cylinder(r=5, h=10, center=true);
		}


// Stereo / 1/4" headphone jack coupler
// Stereo coupler Fits http://www.datapro.net/products/stereo-panel-mount-coupler.html
	if (hole_type == "stereo") {
		translate([0,0,3]) cylinder(r=2.985, h=10, center=true);
		}

//Keystone1 hole
//Hole for 1 Keystone Jack
	if (hole_type == "keystone1") {
		translate([0,0,5]) cube([16.5,15,10], center = true);
	}

//Keystone Solid
	if (hole_type == "keystone_solid") {
		rotate([0,0,90]) {
			difference(){
				translate([0,0,.1]) cube([23,30.5,9.8]);
					translate([4,4,0]){
						difference(){
							cube([15,22.5,10]);
							translate([-1,-0.001,3.501]) cube([17,2,6.5]);
							translate([-1,2.5,-3.40970]) rotate([45,0,0]) cube([17,2,6.5]);
							translate([-1,18.501,6.001]) cube([17,4,4]);
							translate([-1,20.5,0]) rotate([-45,0,0]) cube([17,2,6.5]);
						}
					}
				}
			}
		}

//End of module "hole"
}

  ////////////////////////
 // Number One ENGAGE: //
////////////////////////

// Rotate so it sits correctly on plate (whoops) and make upside down
rotate([0,180,90]){
// put plate at 0,0,0 for easier printing
translate([-height_sizes[plate_size]/2,-solid_plate_width/2,-6]){

if (plate_width == 1) {
	difference() {
		plate();
		translate([0,0,-3]) plate_inner();
		plate1();
			}
		union() {
		plate1_solid();
		}
			}

else if (plate_width == 2) {
difference()
{
plate();
translate([0,0,-3]) plate_inner();
plate1();
plate2();
}
union() {
		plate1_solid();
		plate2_solid();
		}
}

else if (plate_width == 3) {
difference()
{
plate();
translate([0,0,-3]) plate_inner();
plate1();
plate2();
plate3();
}
union() {
		plate1_solid();
		plate2_solid();
		plate3_solid();
		}
}

else if (plate_width == 4) {
difference()
{
plate();
translate([0,0,-3]) plate_inner();
plate1();
plate2();
plate3();
plate4();
}
union() {
		plate1_solid();
		plate2_solid();
		plate3_solid();
		plate4_solid();
		}
}

else if (plate_width == 5) {
difference()
{
plate();
translate([0,0,-3]) plate_inner();
plate1();
plate2();
plate3();
plate4();
plate5();
}
union() {
		plate1_solid();
		plate2_solid();
		plate3_solid();
		plate4_solid();
		plate5_solid();
		}
}

//End Rotate
}
//End Translate
}
